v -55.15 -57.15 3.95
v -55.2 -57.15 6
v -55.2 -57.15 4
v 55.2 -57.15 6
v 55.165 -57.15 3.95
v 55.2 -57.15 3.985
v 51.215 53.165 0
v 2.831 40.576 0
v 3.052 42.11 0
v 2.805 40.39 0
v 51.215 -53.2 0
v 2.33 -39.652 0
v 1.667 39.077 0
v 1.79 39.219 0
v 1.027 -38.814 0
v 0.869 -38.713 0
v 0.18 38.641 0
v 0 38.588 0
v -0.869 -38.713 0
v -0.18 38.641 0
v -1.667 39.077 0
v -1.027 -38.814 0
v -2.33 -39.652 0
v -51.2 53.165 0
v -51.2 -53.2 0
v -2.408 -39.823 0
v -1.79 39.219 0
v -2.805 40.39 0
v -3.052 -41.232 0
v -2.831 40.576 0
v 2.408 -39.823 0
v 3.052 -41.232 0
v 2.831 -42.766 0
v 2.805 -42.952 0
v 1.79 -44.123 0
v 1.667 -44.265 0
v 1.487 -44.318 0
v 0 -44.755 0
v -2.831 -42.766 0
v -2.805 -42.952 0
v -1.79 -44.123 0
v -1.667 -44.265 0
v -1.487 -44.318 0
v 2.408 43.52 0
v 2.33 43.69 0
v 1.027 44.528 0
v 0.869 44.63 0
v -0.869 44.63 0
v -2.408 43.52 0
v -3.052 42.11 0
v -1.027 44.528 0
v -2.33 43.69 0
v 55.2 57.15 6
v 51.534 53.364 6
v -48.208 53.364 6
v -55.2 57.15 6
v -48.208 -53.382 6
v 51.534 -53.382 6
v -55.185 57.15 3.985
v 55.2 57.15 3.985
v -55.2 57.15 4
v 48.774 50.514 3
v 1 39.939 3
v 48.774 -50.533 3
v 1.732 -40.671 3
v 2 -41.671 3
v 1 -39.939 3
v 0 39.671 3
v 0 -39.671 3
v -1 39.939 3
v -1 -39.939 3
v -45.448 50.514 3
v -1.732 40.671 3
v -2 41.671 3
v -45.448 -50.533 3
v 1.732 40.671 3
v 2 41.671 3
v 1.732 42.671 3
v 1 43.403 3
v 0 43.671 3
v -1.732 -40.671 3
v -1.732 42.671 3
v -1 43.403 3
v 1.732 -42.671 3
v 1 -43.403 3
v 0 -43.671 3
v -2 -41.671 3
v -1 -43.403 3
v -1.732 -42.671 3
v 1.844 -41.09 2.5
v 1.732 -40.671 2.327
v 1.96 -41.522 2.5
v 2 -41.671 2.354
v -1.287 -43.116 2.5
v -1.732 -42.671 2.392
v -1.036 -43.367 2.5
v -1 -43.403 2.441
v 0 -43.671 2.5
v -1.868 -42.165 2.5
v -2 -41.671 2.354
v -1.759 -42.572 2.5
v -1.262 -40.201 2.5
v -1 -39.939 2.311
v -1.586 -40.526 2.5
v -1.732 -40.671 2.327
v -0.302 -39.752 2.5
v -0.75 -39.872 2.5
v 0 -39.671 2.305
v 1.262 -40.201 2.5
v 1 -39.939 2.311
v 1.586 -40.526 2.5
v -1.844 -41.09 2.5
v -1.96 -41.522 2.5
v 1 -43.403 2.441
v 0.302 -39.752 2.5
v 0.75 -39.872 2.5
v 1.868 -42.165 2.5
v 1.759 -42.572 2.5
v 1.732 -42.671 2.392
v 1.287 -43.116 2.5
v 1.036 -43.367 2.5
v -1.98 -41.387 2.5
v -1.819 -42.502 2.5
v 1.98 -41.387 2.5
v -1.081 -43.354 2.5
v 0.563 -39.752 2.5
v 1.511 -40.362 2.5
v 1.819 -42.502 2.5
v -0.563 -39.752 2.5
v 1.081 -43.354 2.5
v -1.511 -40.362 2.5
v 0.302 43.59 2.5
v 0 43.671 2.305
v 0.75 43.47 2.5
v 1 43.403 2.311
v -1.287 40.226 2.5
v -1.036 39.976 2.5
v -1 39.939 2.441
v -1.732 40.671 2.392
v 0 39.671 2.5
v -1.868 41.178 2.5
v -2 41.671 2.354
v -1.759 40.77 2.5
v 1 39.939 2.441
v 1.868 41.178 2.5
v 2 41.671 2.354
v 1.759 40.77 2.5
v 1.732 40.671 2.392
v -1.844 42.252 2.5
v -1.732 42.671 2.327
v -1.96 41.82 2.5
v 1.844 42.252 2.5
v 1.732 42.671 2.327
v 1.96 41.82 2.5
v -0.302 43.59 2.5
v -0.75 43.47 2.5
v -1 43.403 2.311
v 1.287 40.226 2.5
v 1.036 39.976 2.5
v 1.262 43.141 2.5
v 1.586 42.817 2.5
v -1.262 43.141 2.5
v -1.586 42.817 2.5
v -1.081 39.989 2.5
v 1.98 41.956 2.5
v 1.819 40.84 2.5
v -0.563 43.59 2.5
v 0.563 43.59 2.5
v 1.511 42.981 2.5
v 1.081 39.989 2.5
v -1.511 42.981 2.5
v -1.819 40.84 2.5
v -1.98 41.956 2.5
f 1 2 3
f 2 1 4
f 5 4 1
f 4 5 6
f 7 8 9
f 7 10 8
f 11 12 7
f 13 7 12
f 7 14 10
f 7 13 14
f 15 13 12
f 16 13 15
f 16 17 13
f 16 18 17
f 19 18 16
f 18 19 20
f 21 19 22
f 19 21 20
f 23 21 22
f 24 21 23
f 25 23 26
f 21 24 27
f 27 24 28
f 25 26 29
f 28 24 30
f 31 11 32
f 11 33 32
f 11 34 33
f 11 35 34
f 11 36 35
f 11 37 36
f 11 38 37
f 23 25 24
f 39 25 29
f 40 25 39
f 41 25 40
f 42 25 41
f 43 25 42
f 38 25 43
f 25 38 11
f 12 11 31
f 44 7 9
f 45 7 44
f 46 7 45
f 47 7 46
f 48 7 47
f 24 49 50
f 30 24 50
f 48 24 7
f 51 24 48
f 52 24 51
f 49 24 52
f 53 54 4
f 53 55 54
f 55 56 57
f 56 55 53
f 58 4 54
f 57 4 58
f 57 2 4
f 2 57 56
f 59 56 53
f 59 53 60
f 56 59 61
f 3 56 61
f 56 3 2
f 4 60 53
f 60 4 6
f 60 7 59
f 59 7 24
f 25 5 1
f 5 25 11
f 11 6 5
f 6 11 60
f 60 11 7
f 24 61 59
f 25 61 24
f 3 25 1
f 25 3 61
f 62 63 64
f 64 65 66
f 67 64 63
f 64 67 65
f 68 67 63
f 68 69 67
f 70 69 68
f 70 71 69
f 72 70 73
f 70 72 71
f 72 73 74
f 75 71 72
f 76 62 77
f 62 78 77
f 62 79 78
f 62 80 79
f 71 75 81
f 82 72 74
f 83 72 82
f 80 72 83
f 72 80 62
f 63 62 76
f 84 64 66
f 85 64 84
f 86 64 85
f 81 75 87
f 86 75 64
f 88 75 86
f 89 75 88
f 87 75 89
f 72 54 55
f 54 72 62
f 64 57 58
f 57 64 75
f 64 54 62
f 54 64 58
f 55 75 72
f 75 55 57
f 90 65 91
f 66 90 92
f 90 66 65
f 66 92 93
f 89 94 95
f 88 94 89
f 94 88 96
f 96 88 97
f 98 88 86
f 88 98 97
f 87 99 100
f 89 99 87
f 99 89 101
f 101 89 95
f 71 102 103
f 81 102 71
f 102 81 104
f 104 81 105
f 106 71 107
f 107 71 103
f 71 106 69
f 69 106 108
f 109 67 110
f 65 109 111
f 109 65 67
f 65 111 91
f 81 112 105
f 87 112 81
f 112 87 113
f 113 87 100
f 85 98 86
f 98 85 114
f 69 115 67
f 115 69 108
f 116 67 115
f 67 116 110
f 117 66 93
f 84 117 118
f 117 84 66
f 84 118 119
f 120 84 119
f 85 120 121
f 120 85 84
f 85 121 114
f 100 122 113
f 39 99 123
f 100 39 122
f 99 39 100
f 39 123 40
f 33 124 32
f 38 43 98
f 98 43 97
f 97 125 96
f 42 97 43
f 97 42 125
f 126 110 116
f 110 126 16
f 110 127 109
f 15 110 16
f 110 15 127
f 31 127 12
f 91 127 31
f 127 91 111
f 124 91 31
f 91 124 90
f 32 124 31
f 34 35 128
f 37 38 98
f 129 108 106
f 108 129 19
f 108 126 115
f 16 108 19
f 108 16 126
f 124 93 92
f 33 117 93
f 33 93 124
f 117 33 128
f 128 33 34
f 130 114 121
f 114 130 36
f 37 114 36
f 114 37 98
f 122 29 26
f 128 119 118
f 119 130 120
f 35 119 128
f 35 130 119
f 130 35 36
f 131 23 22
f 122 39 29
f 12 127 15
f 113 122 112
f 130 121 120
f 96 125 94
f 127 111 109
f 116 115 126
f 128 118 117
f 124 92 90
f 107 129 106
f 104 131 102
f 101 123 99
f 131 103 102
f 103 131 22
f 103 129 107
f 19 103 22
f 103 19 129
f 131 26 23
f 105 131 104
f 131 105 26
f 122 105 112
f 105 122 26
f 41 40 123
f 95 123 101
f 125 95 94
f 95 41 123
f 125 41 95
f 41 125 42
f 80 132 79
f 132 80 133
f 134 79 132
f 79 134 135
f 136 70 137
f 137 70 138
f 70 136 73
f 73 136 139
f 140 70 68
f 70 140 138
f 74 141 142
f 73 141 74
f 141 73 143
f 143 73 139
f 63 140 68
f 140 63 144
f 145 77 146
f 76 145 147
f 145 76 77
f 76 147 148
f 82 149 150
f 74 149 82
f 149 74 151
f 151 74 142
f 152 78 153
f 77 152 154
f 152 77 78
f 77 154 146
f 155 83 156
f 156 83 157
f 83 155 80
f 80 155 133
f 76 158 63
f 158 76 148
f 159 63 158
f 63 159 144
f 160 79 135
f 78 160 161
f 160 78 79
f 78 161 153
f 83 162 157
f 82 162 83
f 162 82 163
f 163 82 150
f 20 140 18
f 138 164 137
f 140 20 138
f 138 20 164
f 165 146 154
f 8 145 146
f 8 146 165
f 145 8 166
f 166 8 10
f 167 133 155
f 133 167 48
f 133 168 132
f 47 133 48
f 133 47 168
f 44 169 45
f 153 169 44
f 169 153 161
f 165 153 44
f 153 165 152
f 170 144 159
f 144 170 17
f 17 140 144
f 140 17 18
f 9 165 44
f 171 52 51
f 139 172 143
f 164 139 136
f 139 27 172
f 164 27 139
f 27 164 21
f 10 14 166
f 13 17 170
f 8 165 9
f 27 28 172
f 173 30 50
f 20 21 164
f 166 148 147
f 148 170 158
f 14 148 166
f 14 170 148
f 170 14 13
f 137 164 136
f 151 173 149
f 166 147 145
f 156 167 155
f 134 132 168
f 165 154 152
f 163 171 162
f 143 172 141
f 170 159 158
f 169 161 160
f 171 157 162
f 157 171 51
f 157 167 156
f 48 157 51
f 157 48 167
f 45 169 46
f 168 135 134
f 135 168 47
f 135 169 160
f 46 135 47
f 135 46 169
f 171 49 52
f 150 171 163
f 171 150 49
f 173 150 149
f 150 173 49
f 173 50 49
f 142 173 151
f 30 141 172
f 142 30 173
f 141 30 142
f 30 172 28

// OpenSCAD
// WALLY - Wall Plate Customizer v1.3
// by TheNewHobbyist 2013 (http://thenewhobbyist.com)
// http://www.thingiverse.com/thing:47956
//
// Most of the connectors used with this thing are panel mount connectors from
// www.DataPro.net I can't vouch for their quality but they did have easy to
// find dimensions for their products so I used them.
//
// This could be tightened up considerably but I thought I'd get it out there for people
// to experiment with before I lose my mind staring at it too long. Also this is my
// first OpenSCAD model so cut me some slack ;)
//
//   Notes:
//
// * The plug types "Duplex Outlet", "Long_Toggle Switch", "Toggle Switch", and "Rocker"
//   will all use the entire plate when selected in top or bottom configuration. The
//   other selection (if not "none" will be selected.
//
// * "None" and "Blank should not be considered equal. if "None" is selected for one of
//   the two holes on a plate the other selection will be centered on that plate. If
//   "Blank" is selected that plug location will remain blank but the other selection
//   will NOT move into a centered position.
//
//	Change Log:
//
//	v1.1
//	UPDATED: Screw hole locations for designer and toggle plate types.
//	UPDATED: Hole size for designer plate type.
//	UPDATED: Outlet hole spacing
//
//	v1.2
//	ADDED: Long Toggle Switch for laird
//
//	v1.3
//	ADDED: 3 new sizes for plate export: Standard, Junior-Jumbo, and Jumbo.
//

  //////////////////////////
 // Customizer Settings: //
//////////////////////////

//How big are we talkin' here?
plate_width = 1; //	[1:5]

// Bigger hole in your wall? Try this
plate_size = 0; // [0:Standard, 1:Junior-Jumbo, 2:Jumbo,]

//Pick a plug or full plate type
1st_plate = "none";  //	["none":None, "blank":Blank Port, "toggle":Full Plate - Toggle Switch, "long_toggle":Full Plate - Long Toggle Switch, "outlet":Full Plate - Duplex Outlet, "rocker":Full Plate - Rocker/Designer Plate, "keystone1":Keystone Jack, "vga":VGA Port, "hdmi":HDMI Port, "dvi":DVI-I Port, "displayport":Displayport, "cat5e":Cat5e/Cat6 Port, "usb-a":USB-A Port, "usb-b":USB-B Port, "firewire":Firewire IEEE 1394 Port, "db09":DB-09 Port, "ps2":PS2 Port, "f-type": F-Type/Coaxial Port,"svideo":S-Video Port, "stereo":Stereo Headphone Jack]
//Pick a bottom plug type or leave as none
1st_plate_bottom_hole = "none";  //	["none":None, "blank":Blank Port, "keystone1":Keystone Jack, "vga":VGA Port, "hdmi":HDMI Port, "dvi":DVI-I Port, "displayport":Displayport, "cat5e":Cat5e/Cat6 Port, "usb-a":USB-A Port, "usb-b":USB-B Port, "firewire":Firewire IEEE 1394 Port, "db09":DB-09 Port, "ps2":PS2 Port, "f-type": F-Type/Coaxial Port,"svideo":S-Video Port, "stereo":Stereo Headphone Jack]
//Pick a plug or full plate type
2nd_plate = "none";  //	["none":None, "blank":Blank Port, "toggle":Full Plate - Toggle Switch, "long_toggle":Full Plate - Long Toggle Switch, "outlet":Full Plate - Duplex Outlet, "rocker":Full Plate - Rocker/Designer Plate, "keystone1":Keystone Jack, "vga":VGA Port, "hdmi":HDMI Port, "dvi":DVI-I Port, "displayport":Displayport, "cat5e":Cat5e/Cat6 Port, "usb-a":USB-A Port, "usb-b":USB-B Port, "firewire":Firewire IEEE 1394 Port, "db09":DB-09 Port, "ps2":PS2 Port, "f-type": F-Type/Coaxial Port,"svideo":S-Video Port, "stereo":Stereo Headphone Jack]
//Pick a bottom plug type or leave as none
2nd_plate_bottom_hole = "none";  //	["none":None, "blank":Blank Port, "keystone1":Keystone Jack, "vga":VGA Port, "hdmi":HDMI Port, "dvi":DVI-I Port, "displayport":Displayport, "cat5e":Cat5e/Cat6 Port, "usb-a":USB-A Port, "usb-b":USB-B Port, "firewire":Firewire IEEE 1394 Port, "db09":DB-09 Port, "ps2":PS2 Port, "f-type": F-Type/Coaxial Port,"svideo":S-Video Port, "stereo":Stereo Headphone Jack]
//Pick a plug or full plate type
3rd_plate = "none";  //	["none":None, "blank":Blank Port, "toggle":Full Plate - Toggle Switch, "long_toggle":Full Plate - Long Toggle Switch, "outlet":Full Plate - Duplex Outlet, "rocker":Full Plate - Rocker/Designer Plate, "keystone1":Keystone Jack, "vga":VGA Port, "hdmi":HDMI Port, "dvi":DVI-I Port, "displayport":Displayport, "cat5e":Cat5e/Cat6 Port, "usb-a":USB-A Port, "usb-b":USB-B Port, "firewire":Firewire IEEE 1394 Port, "db09":DB-09 Port, "ps2":PS2 Port, "f-type": F-Type/Coaxial Port,"svideo":S-Video Port, "stereo":Stereo Headphone Jack]
//Pick a bottom plug type or leave as none
3rd_plate_bottom_hole = "none";  //	["none":None, "blank":Blank Port, "keystone1":Keystone Jack, "vga":VGA Port, "hdmi":HDMI Port, "dvi":DVI-I Port, "displayport":Displayport, "cat5e":Cat5e/Cat6 Port, "usb-a":USB-A Port, "usb-b":USB-B Port, "firewire":Firewire IEEE 1394 Port, "db09":DB-09 Port, "ps2":PS2 Port, "f-type": F-Type/Coaxial Port,"svideo":S-Video Port, "stereo":Stereo Headphone Jack]
//Pick a plug or full plate type
4th_plate = "none";  //["none":None, "blank":Blank Port, "toggle":Full Plate - Toggle Switch, "long_toggle":Full Plate - Long Toggle Switch, "outlet":Full Plate - Duplex Outlet, "rocker":Full Plate - Rocker/Designer Plate, "keystone1":Keystone Jack, "vga":VGA Port, "hdmi":HDMI Port, "dvi":DVI-I Port, "displayport":Displayport, "cat5e":Cat5e/Cat6 Port, "usb-a":USB-A Port, "usb-b":USB-B Port, "firewire":Firewire IEEE 1394 Port, "db09":DB-09 Port, "ps2":PS2 Port, "f-type": F-Type/Coaxial Port,"svideo":S-Video Port, "stereo":Stereo Headphone Jack]
//Pick a bottom plug type or leave as none
4th_plate_bottom_hole = "none";  //	["none":None, "blank":Blank Port, "keystone1":Keystone Jack, "vga":VGA Port, "hdmi":HDMI Port, "dvi":DVI-I Port, "displayport":Displayport, "cat5e":Cat5e/Cat6 Port, "usb-a":USB-A Port, "usb-b":USB-B Port, "firewire":Firewire IEEE 1394 Port, "db09":DB-09 Port, "ps2":PS2 Port, "f-type": F-Type/Coaxial Port,"svideo":S-Video Port, "stereo":Stereo Headphone Jack]
//Pick a plug or full plate type
5th_plate = "none";  //["none":None, "blank":Blank Port, "toggle":Full Plate - Toggle Switch, "long_toggle":Full Plate - Long Toggle Switch, "outlet":Full Plate - Duplex Outlet, "rocker":Full Plate - Rocker/Designer Plate, "keystone1":Keystone Jack, "vga":VGA Port, "hdmi":HDMI Port, "dvi":DVI-I Port, "displayport":Displayport, "cat5e":Cat5e/Cat6 Port, "usb-a":USB-A Port, "usb-b":USB-B Port, "firewire":Firewire IEEE 1394 Port, "db09":DB-09 Port, "ps2":PS2 Port, "f-type": F-Type/Coaxial Port,"svideo":S-Video Port, "stereo":Stereo Headphone Jack]
//Pick a bottom plug type or leave as none
5th_plate_bottom_hole = "none";  //	["none":None, "blank":Blank Port, "keystone1":Keystone Jack, "vga":VGA Port, "hdmi":HDMI Port, "dvi":DVI-I Port, "displayport":Displayport, "cat5e":Cat5e/Cat6 Port, "usb-a":USB-A Port, "usb-b":USB-B Port, "firewire":Firewire IEEE 1394 Port, "db09":DB-09 Port, "ps2":PS2 Port, "f-type": F-Type/Coaxial Port,"svideo":S-Video Port, "stereo":Stereo Headphone Jack]

  //////////////////////
 // Static Settings: //
//////////////////////

module GoAwayCustomizer() {
// This module is here to stop Customizer from picking up the variables below
}

l_offset = [55.2,39.6875,44.45];//34.925,39.6875
r_offset = [55.2,39.6875,44.45];
spacer = [0,0,46.0375,92.075,138.1125,184.15];
solid_plate_width = l_offset[plate_size] + spacer[plate_width] + r_offset[plate_size];//!!!!plate width squeaspacer[plate_width*2] r!!!!!

height_sizes = [114.3,123.825,133.35];

height =114.3 ; //plate height (static)114.3
gang_width=[0,69.86,115.824,161.925,206.375,254]; // Plate widths (standard)69.86

edgewidth = solid_plate_width + 10; // Bevel setting for top and bottom
rightbevel = solid_plate_width -4; // Bevel for right side (scales)

left_offset = 34.925; // Offset first hole position34.925
switch_offset = 46.0375; // Offset all additional holes
thinner_offset=[0,0.92,0.95,0.96,0.97,0.973]; // Manual fix for right side wackiness

positions=[height_sizes[plate_size]/2,height_sizes[plate_size]/2 - 14.25,height_sizes[plate_size]/2 + 14.25];

// preview[view:north, tilt:bottom]

  ///////////////////
 // Hole Control: //
///////////////////

module plate1(){
	if (1st_plate == "toggle" || 1st_plate_bottom_hole == "toggle"){
		translate([0,l_offset[plate_size],0]) toggle_screws();
		translate([0,l_offset[plate_size],0]) hole("toggle");
		}
	else if (1st_plate == "long_toggle" || 1st_plate_bottom_hole == "long_toggle"){
		translate([0,l_offset[plate_size],0]) toggle_screws();
		translate([0,l_offset[plate_size],0]) hole("long_toggle");
		}
	else if (1st_plate == "rocker" || 1st_plate_bottom_hole == "rocker"){
		translate([0,l_offset[plate_size],0]) rocker_screws();
		translate([0,l_offset[plate_size],0]) hole("rocker");
		}
	else if (1st_plate == "outlet" || 1st_plate_bottom_hole == "outlet") {
	translate([0,l_offset[plate_size],0]) hole("outlet");
	}
	else if (1st_plate_bottom_hole == "none") {
		translate([0,l_offset[plate_size],0]) box_screws();
		translate([positions[0],l_offset[plate_size],0]) hole(1st_plate);
			}
	else if (1st_plate == "none") {
		translate([0,l_offset[plate_size],0]) box_screws();
		translate([positions[0],l_offset[plate_size],0]) hole(1st_plate_bottom_hole);
			}
	else {
	translate([0,l_offset[plate_size],0]) box_screws();
	translate([positions[1],l_offset[plate_size],0]) hole(1st_plate);
	translate([positions[2],l_offset[plate_size],0]) hole(1st_plate_bottom_hole);
	}
}

module plate2(){
	if (2nd_plate == "toggle" || 2nd_plate_bottom_hole == "toggle"){
		translate([0,l_offset[plate_size] + switch_offset,0]) toggle_screws();
		translate([0,l_offset[plate_size] + switch_offset,0]) hole("toggle");
		}
	else if (2nd_plate == "long_toggle" || 2nd_plate_bottom_hole == "long_toggle"){
		translate([0,l_offset[plate_size] + switch_offset,0]) toggle_screws();
		translate([0,l_offset[plate_size] + switch_offset,0]) hole("long_toggle");
		}
	else if (2nd_plate == "rocker" || 2nd_plate_bottom_hole == "rocker"){
		translate([0,l_offset[plate_size] + switch_offset,0]) rocker_screws();
		translate([0,l_offset[plate_size] + switch_offset,0]) hole("rocker");
		}
	else if (2nd_plate == "outlet" || 2nd_plate_bottom_hole == "outlet") {
	translate([0,l_offset[plate_size] + switch_offset,0]) hole("outlet");
	}
	else if (2nd_plate_bottom_hole == "none") {
		translate([0,l_offset[plate_size] + switch_offset,0]) box_screws();
		translate([positions[0],l_offset[plate_size] + switch_offset,0]) hole(2nd_plate);
			}
	else if (2nd_plate == "none") {
		translate([0,l_offset[plate_size] + switch_offset,0]) box_screws();
		translate([positions[0],l_offset[plate_size] + switch_offset,0]) hole(2nd_plate_bottom_hole);
			}
	else {
	translate([0,l_offset[plate_size] + switch_offset,0]) box_screws();
	translate([positions[1],l_offset[plate_size] + switch_offset,0]) hole(2nd_plate);
	translate([positions[2],l_offset[plate_size] + switch_offset,0]) hole(2nd_plate_bottom_hole);
	}
}

module plate3(){
	if (3rd_plate == "toggle" || 3rd_plate_bottom_hole == "toggle"){
		translate([0,l_offset[plate_size] + switch_offset * 2,0]) toggle_screws();
		translate([0,l_offset[plate_size] + switch_offset * 2,0]) hole("toggle");
		}
	else if (3rd_plate == "long_toggle" || 3rd_plate_bottom_hole == "long_toggle"){
		translate([0,l_offset[plate_size] + switch_offset * 2,0]) toggle_screws();
		translate([0,l_offset[plate_size] + switch_offset * 2,0]) hole("long_toggle");
		}
	else if (3rd_plate == "rocker" || 3rd_plate_bottom_hole == "rocker"){
		translate([0,l_offset[plate_size] + switch_offset * 2,0]) rocker_screws();
		translate([0,l_offset[plate_size] + switch_offset * 2,0]) hole("rocker");
		}
	else if (3rd_plate == "outlet" || 3rd_plate_bottom_hole == "outlet") {
	translate([0,l_offset[plate_size] + switch_offset * 2,0]) hole("outlet");
	}
	else if (3rd_plate_bottom_hole == "none") {
		translate([0,l_offset[plate_size] + switch_offset * 2,0]) box_screws();
		translate([positions[0],l_offset[plate_size] + switch_offset * 2,0]) hole(3rd_plate);
			}
	else if (3rd_plate == "none") {
		translate([0,l_offset[plate_size] + switch_offset * 2,0]) box_screws();
		translate([positions[0],l_offset[plate_size] + switch_offset * 2,0]) hole(3rd_plate_bottom_hole);
			}
	else {
	translate([0,l_offset[plate_size] + switch_offset * 2,0]) box_screws();
	translate([positions[1],l_offset[plate_size] + switch_offset * 2,0]) hole(3rd_plate);
	translate([positions[2],l_offset[plate_size] + switch_offset * 2,0]) hole(3rd_plate_bottom_hole);
	}
}

module plate4(){
	if (4th_plate == "toggle" || 4th_plate_bottom_hole == "toggle"){
		translate([0,l_offset[plate_size] + switch_offset * 3,0]) toggle_screws();
		translate([0,l_offset[plate_size] + switch_offset * 3,0]) hole("toggle");
		}
	else if (4th_plate == "long_toggle" || 4th_plate_bottom_hole == "long_toggle"){
		translate([0,l_offset[plate_size] + switch_offset * 3,0]) toggle_screws();
		translate([0,l_offset[plate_size] + switch_offset * 3,0]) hole("long_toggle");
		}
	else if (4th_plate == "rocker" || 4th_plate_bottom_hole == "rocker"){
		translate([0,l_offset[plate_size] + switch_offset * 3,0]) rocker_screws();
		translate([0,l_offset[plate_size] + switch_offset * 3,0]) hole("rocker");
		}
	else if (4th_plate == "outlet" || 4th_plate_bottom_hole == "outlet") {
	translate([0,l_offset[plate_size] + switch_offset * 3,0]) hole("outlet");
	}
	else if (4th_plate_bottom_hole == "none") {
		translate([0,l_offset[plate_size] + switch_offset * 3,0]) box_screws();
		translate([positions[0],l_offset[plate_size] + switch_offset * 3,0]) hole(4th_plate);
			}
	else if (4th_plate == "none") {
		translate([0,l_offset[plate_size] + switch_offset * 3,0]) box_screws();
		translate([positions[0],l_offset[plate_size] + switch_offset * 3,0]) hole(4th_plate_bottom_hole);
			}
	else {
	translate([0,l_offset[plate_size] + switch_offset * 3,0]) box_screws();
	translate([positions[1],l_offset[plate_size] + switch_offset * 3,0]) hole(4th_plate);
	translate([positions[2],l_offset[plate_size] + switch_offset * 3,0]) hole(4th_plate_bottom_hole);
	}
}

module plate5(){
	if (5th_plate == "toggle" || 5th_plate_bottom_hole == "toggle"){
		translate([0,l_offset[plate_size] + switch_offset * 4,0]) toggle_screws();
		translate([0,l_offset[plate_size] + switch_offset * 4,0]) hole("toggle");
		}
	else if (5th_plate == "long_toggle" || 5th_plate_bottom_hole == "long_toggle"){
		translate([0,l_offset[plate_size] + switch_offset * 4,0]) toggle_screws();
		translate([0,l_offset[plate_size] + switch_offset * 4,0]) hole("long_toggle");
		}
	else if (5th_plate == "rocker" || 5th_plate_bottom_hole == "rocker"){
		translate([0,l_offset[plate_size] + switch_offset * 4,0]) rocker_screws();
		translate([0,l_offset[plate_size] + switch_offset * 4,0]) hole("rocker");
		}
	else if (5th_plate == "outlet" || 5th_plate_bottom_hole == "outlet") {
	translate([0,l_offset[plate_size] + switch_offset * 4,0]) hole("outlet");
	}
	else if (5th_plate_bottom_hole == "none") {
		translate([0,l_offset[plate_size] + switch_offset * 4,0]) box_screws();
		translate([positions[0],l_offset[plate_size] + switch_offset * 4,0]) hole(5th_plate);
			}
	else if (5th_plate == "none") {
		translate([0,l_offset[plate_size] + switch_offset * 4,0]) box_screws();
		translate([positions[0],l_offset[plate_size] + switch_offset * 4,0]) hole(5th_plate_bottom_hole);
			}
	else {
	translate([0,l_offset[plate_size] + switch_offset * 4,0]) box_screws();
	translate([positions[1],l_offset[plate_size] + switch_offset * 4,0]) hole(5th_plate);
	translate([positions[2],l_offset[plate_size] + switch_offset * 4,0]) hole(5th_plate_bottom_hole);
	}
}

  /////////////////
 // SolidWorks: //
/////////////////

module plate1_solid(){
if (1st_plate == "keystone1" && 1st_plate_bottom_hole == "none") {
	translate([height_sizes[plate_size]/2 + 14.3,l_offset[plate_size] - 11.5,-3.9]) hole("keystone_solid");
	}
else if (1st_plate == "keystone1" && 1st_plate_bottom_hole != "outlet" && 1st_plate_bottom_hole != "toggle" && 1st_plate_bottom_hole != "rocker") {
	translate([height_sizes[plate_size]/2,l_offset[plate_size] - 11.5,-3.9]) hole("keystone_solid");
	}
if (1st_plate_bottom_hole == "keystone1" && 1st_plate == "none") {
	translate([height_sizes[plate_size]/2 + 14.3,l_offset[plate_size] - 11.5,-3.9]) hole("keystone_solid");
	}
else if (1st_plate_bottom_hole == "keystone1" && 1st_plate != "outlet" && 1st_plate != "toggle" && 1st_plate != "rocker") {
	translate([height_sizes[plate_size]/2 + 28.5,l_offset[plate_size] - 11.5,-3.9]) hole("keystone_solid");
	}

}

module plate2_solid(){
if (2nd_plate == "keystone1" && 2nd_plate_bottom_hole == "none") {
	translate([height_sizes[plate_size]/2 + 14.3,l_offset[plate_size] - 11.5 + switch_offset,-3.9]) hole("keystone_solid");
	}
else if (2nd_plate == "keystone1" && 2nd_plate_bottom_hole != "outlet" && 2nd_plate_bottom_hole != "toggle" && 2nd_plate_bottom_hole != "rocker") {
	translate([height_sizes[plate_size]/2,l_offset[plate_size] - 11.5 + switch_offset,-3.9]) hole("keystone_solid");
	}
if (2nd_plate_bottom_hole == "keystone1" && 2nd_plate == "none") {
	translate([height_sizes[plate_size]/2 + 14.3,l_offset[plate_size] - 11.5 + switch_offset,-3.9]) hole("keystone_solid");
	}
else if (2nd_plate_bottom_hole == "keystone1" && 2nd_plate != "outlet" && 2nd_plate != "toggle" && 2nd_plate != "rocker") {
	translate([height_sizes[plate_size]/2 + 28.5,l_offset[plate_size] - 11.5 + switch_offset,-3.9]) hole("keystone_solid");
	}

}

module plate3_solid(){
if (3rd_plate == "keystone1" && 3rd_plate_bottom_hole == "none") {
	translate([height_sizes[plate_size]/2 + 14.3,l_offset[plate_size] - 11.5 + switch_offset * 2,-3.9]) hole("keystone_solid");
	}
else if (3rd_plate == "keystone1" && 3rd_plate_bottom_hole != "outlet" && 3rd_plate_bottom_hole != "toggle" && 3rd_plate_bottom_hole != "rocker") {
	translate([height_sizes[plate_size]/2,l_offset[plate_size] - 11.5 + switch_offset * 2,-3.9]) hole("keystone_solid");
	}
if (3rd_plate_bottom_hole == "keystone1" && 3rd_plate == "none") {
	translate([height_sizes[plate_size]/2 + 14.3,l_offset[plate_size] - 11.5 + switch_offset * 2,-3.9]) hole("keystone_solid");
	}
else if (3rd_plate_bottom_hole == "keystone1" && 3rd_plate != "outlet" && 3rd_plate != "toggle" && 3rd_plate != "rocker") {
	translate([height_sizes[plate_size]/2 + 28.5,l_offset[plate_size] - 11.5 + switch_offset * 2,-3.9]) hole("keystone_solid");
	}

}

module plate4_solid(){
if (4th_plate == "keystone1" && 4th_plate_bottom_hole == "none") {
	translate([height_sizes[plate_size]/2 + 14.3,l_offset[plate_size] - 11.5 + switch_offset * 3,-3.9]) hole("keystone_solid");
	}
else if (4th_plate == "keystone1" && 4th_plate_bottom_hole != "outlet" && 4th_plate_bottom_hole != "toggle" && 4th_plate_bottom_hole != "rocker") {
	translate([height_sizes[plate_size]/2,l_offset[plate_size] - 11.5 + switch_offset * 3,-3.9]) hole("keystone_solid");
	}
if (4th_plate_bottom_hole == "keystone1" && 4th_plate == "none") {
	translate([height_sizes[plate_size]/2 + 14.3,l_offset[plate_size] - 11.5 + switch_offset * 3,-3.9]) hole("keystone_solid");
	}
else if (4th_plate_bottom_hole == "keystone1" && 4th_plate != "outlet" && 4th_plate != "toggle" && 4th_plate != "rocker") {
	translate([height_sizes[plate_size]/2 + 28.5,l_offset[plate_size] - 11.5 + switch_offset * 3,-3.9]) hole("keystone_solid");
	}

}

module plate5_solid(){
if (5th_plate == "keystone1" && 5th_plate_bottom_hole == "none") {
	translate([height_sizes[plate_size]/2 + 14.3,l_offset[plate_size] - 11.5 + switch_offset * 4,-3.9]) hole("keystone_solid");
	}
else if (5th_plate == "keystone1" && 5th_plate_bottom_hole != "outlet" && 5th_plate_bottom_hole != "toggle" && 5th_plate_bottom_hole != "rocker") {
	translate([height_sizes[plate_size]/2,l_offset[plate_size] - 11.5 + switch_offset * 4,-3.9]) hole("keystone_solid");
	}
if (5th_plate_bottom_hole == "keystone1" && 5th_plate == "none") {
	translate([height_sizes[plate_size]/2 + 14.3,l_offset[plate_size] - 11.5 + switch_offset * 4,-3.9]) hole("keystone_solid");
	}
else if (5th_plate_bottom_hole == "keystone1" && 5th_plate != "outlet" && 5th_plate != "toggle" && 5th_plate != "rocker") {
	translate([height_sizes[plate_size]/2 + 28.5,l_offset[plate_size] - 11.5 + switch_offset * 4,-3.9]) hole("keystone_solid");
	}

}

  ///////////////////
 // PlateStation: //
///////////////////

//Plate size and bevel
module plate() {
	difference() {
		cube([height_sizes[plate_size],solid_plate_width,6]);//solid_plate_width
		translate([-4.3,-5,6.2]) rotate([0,45,0]) cube([6,edgewidth,6]); //Top Bevel
		translate([height_sizes[plate_size]-4.2,-5,6.25]) rotate([0,45,0]) cube([6,edgewidth,6]); //Bottom Bevel
		translate([height_sizes[plate_size]+10,-4.4,6.1]) rotate([0,45,90]) cube([6,height_sizes[plate_size]+20,6]); //Left Bevel (doesn't change)
		translate([height_sizes[plate_size]+10,rightbevel,6]) rotate([0,45,90]) cube([6,height_sizes[plate_size]+10,6]); //Right Bevel (scales right)
				}
			}


// Thinning Plate
module plate_inner() {
	scale([0.95,thinner_offset[plate_width],1]){
	translate([3,3,0]){
	difference() {
		cube([height_sizes[plate_size],solid_plate_width,6]);
		translate([-4.3,-5,6.2]) rotate([0,45,0]) cube([6,edgewidth,6]); //Top Bevel
		translate([height_sizes[plate_size]-4.2,-5,6.25]) rotate([0,45,0]) cube([6,edgewidth,6]); //Bottom Bevel
		translate([height_sizes[plate_size]+10,-4.4,6.1]) rotate([0,45,90]) cube([6,height_sizes[plate_size]+20,6]); //Left Bevel (doesn't change)
		translate([height_sizes[plate_size]+10,rightbevel,6]) rotate([0,45,90]) cube([6,height_sizes[plate_size]+10,6]); //Right Bevel (scales right)
				}
			}
		}
	}

// Box screw holes
module box_screws(){
	 translate([height_sizes[plate_size]/2 + 41.67125,0,-1]) cylinder(r=2, h=10, $fn=12);//23 position of holes
	 translate([height_sizes[plate_size]/2 + 41.67125,0,3.5]) cylinder(r1=2, r2=3.3, h=3);
	 translate([height_sizes[plate_size]/2 - 41.67125,0,-1]) cylinder(r=2, h=10, $fn=12);
	 translate([height_sizes[plate_size]/2 - 41.67125,0,3.5]) cylinder(r1=2, r2=3.3, h=3);
}

// Rocker/Designer screw holes
module rocker_screws(){
	 translate([height_sizes[plate_size]/2 + 48.41875,0,-1]) cylinder(r=2, h=10, $fn=12);
	 translate([height_sizes[plate_size]/2 + 48.41875,0,3.5]) cylinder(r1=2, r2=3.3, h=3);
	 translate([height_sizes[plate_size]/2 - 48.41875,0,-1]) cylinder(r=2, h=10, $fn=12);
	 translate([height_sizes[plate_size]/2 - 48.41875,0,3.5]) cylinder(r1=2, r2=3.3, h=3);
}

// Toggle screw holes
module toggle_screws(){
	 translate([height_sizes[plate_size]/2 + 30.1625,0,-1]) cylinder(r=2, h=10, $fn=12);
	 translate([height_sizes[plate_size]/2 + 30.1625,0,3.5]) cylinder(r1=2, r2=3.3, h=3);
	 translate([height_sizes[plate_size]/2 - 30.1625,0,-1]) cylinder(r=2, h=10, $fn=12);
	 translate([height_sizes[plate_size]/2 - 30.1625,0,3.5]) cylinder(r1=2, r2=3.3, h=3);
}

  ///////////////
 // Portland: //
///////////////

// Hole Cutout definitions
module hole(hole_type) {


// Toggle switch hole
	if (hole_type == "toggle") {
		translate([height_sizes[plate_size]/2,0,0]) cube([23.8125,10.3188,15], center = true);
		 						}

// Toggle switch hole and screw holes
	if (hole_type == "long_toggle") {
		translate([height_sizes[plate_size]/2,0,0]) cube([43.6563,11.9063,15], center = true);
		 						}

// Rocker switch plate
	if (hole_type == "rocker") {
		translate([height_sizes[plate_size]/2,0,0]) cube([67.1,33.3,15], center = true);

		 						}

// Duplex power outlet plate or dual side toggles
	if (hole_type == "outlet" || hole_type == "dualsidetoggle") {
		translate([height_sizes[plate_size]/2 + 19.3915,0,0]) {
			difference() {
				cylinder(r=17.4625, h=15, center = true);
				translate([-24.2875,-15,-2]) cube([10,37,15], center = false);
				translate([14.2875,-15,-2]) cube([10,37,15], center = false);
								}
							}
		translate([height_sizes[plate_size]/2 - 19.3915,0,0]){
			difference(){
				cylinder(r=17.4625, h=15, center = true);
				translate([-24.2875,-15,-2]) cube([10,37,15], center = false);
				translate([14.2875,-15,-2]) cube([10,37,15], center = false);
								}
							}
		translate([height_sizes[plate_size]/2,0,-1]) cylinder(r=2, h=10);
		translate([height_sizes[plate_size]/2,0,3.5]) cylinder(r1=2, r2=3.3, h=3);
							}

// Blank plate
	if (hole_type == "blank") { }

// VGA & DB09 plate
// VGA Fits http://www.datapro.net/products/vga-dual-panel-mount-f-f-cable.html
// DB09 Fits http://www.datapro.net/products/db9-serial-panel-mount-male-extension.html
	if (hole_type == "vga" || hole_type == "db09") {

			translate([0,-12.5,3]) cylinder(r=1.75, h=10, center = true);
			translate([0,12.5,3]) cylinder(r=1.75, h=10, center = true);
				difference(){
					cube([10,19,13], center=true);
					translate([-5,-9.2,1]) rotate([0,0,-35.6]) cube([4.4,2.4,15], center=true);
					translate([.9,-11.2,0]) rotate([0,0,9.6]) cube([10,4.8,15], center=true);
					translate([4.6,-8.5,0]) rotate([0,0,37.2]) cube([4.4,2.4,15], center=true);
					translate([-5,9.2,1]) rotate([0,0,35.6]) cube([4.4,2.4,15], center=true);
					translate([0.9,11.2,0]) rotate([0,0,-9.6]) cube([10,4.8,15], center=true);
					translate([4.6,8.5,0]) rotate([0,0,-37.2]) cube([4.4,2.4,15], center=true);
								}
						}

// HDMI plate
// Fits http://www.datapro.net/products/hdmi-panel-mount-extension-cable.html
	if (hole_type == "hdmi") {
		translate([0,-13,3]) cylinder(r=1.75, h=10, center = true);
		translate([0,13,3]) cylinder(r=1.75, h=10, center = true);
		translate([0,0,3]) cube([6,16,10], center=true);
							}

// DVI-I plate
// Fits http://www.datapro.net/products/dvi-i-panel-mount-extension-cable.html
	if (hole_type == "dvi") {
		translate([0,-16,3]) cylinder(r=1.75, h=10, center = true);
		translate([0,16,3]) cylinder(r=1.75, h=10, center = true);
		translate([0,0,3]) cube([10,26,10], center=true);
							}

// DisplayPort plate
// Fits http://www.datapro.net/products/dvi-i-panel-mount-extension-cable.html
	if (hole_type == "displayport") {
		translate([0,-13.5,3]) cylinder(r=1.75, h=10, center = true);
		translate([0,13.5,3]) cylinder(r=1.75, h=10, center = true);
		translate([0,0,0]){
			difference(){
				translate([0,0,3]) cube([7,19,10], center=true);
				translate([2.47,-9.37,3]) rotate([0,0,-54.6]) cube([3,5,14], center=true);
						}
								}
									}

// USB-A Plate
// Fits http://www.datapro.net/products/usb-panel-mount-type-a-cable.html
	if (hole_type == "usb-a") {
		translate([0,-15,3]) cylinder(r=1.75, h=10, center = true);
		translate([0,15,3]) cylinder(r=1.75, h=10, center = true);
		translate([0,0,3]) cube([8,16,10], center=true);
							}

// USB-B Plate
// Fits http://www.datapro.net/products/usb-panel-mount-type-b-cable.html
	if (hole_type == "usb-b") {
		translate([0,-13,3]) cylinder(r=1.75, h=10, center = true);
		translate([0,13,3]) cylinder(r=1.75, h=10, center = true);
		translate([0,0,3]) cube([11,12,10], center=true);
							}

// 1394 Firewire Plate
// Fits http://www.datapro.net/products/firewire-panel-mount-extension.html
	if (hole_type == "firewire") {
		translate([0,-13.5,3]) cylinder(r=1.75, h=10, center = true);
		translate([0,13.5,3]) cylinder(r=1.75, h=10, center = true);
		translate([0,0,3]) cube([7,12,10], center=true);
							}

// F-Type / Cable TV Plate
// Fits http://www.datapro.net/products/f-type-panel-mounting-coupler.html
	if (hole_type == "f-type") {
		translate([0,0,3]) cylinder(r=4.7625, h=10, center=true);
							}

// Cat5e & Gat6 plate
// Cat5e Fits http://www.datapro.net/products/cat-5e-panel-mount-ethernet.html
// Cat6 Fits hhttp://www.datapro.net/products/cat-6-panel-mount-ethernet.html
	if (hole_type == "cat5e" || hole_type == "cat6") {
		translate([0,-12.5,3]) cylinder(r=1.75, h=10, center = true);
		translate([0,12.5,3]) cylinder(r=1.75, h=10, center = true);
		translate([0,0,3]) cube([15,15,10], center=true);
		}

// S-Video & PS2 plate
// S-Video Fits hhttp://www.datapro.net/products/cat-6-panel-mount-ethernet.html
// PS2 http://www.datapro.net/products/ps2-panel-mount-extension-cable.html
	if (hole_type == "svideo" || hole_type == "ps2") {
		translate([0,-10,3]) cylinder(r=1.75, h=10, center = true);
		translate([0,10,3]) cylinder(r=1.75, h=10, center = true);
		translate([0,0,3]) cylinder(r=5, h=10, center=true);
		}


// Stereo / 1/4" headphone jack coupler
// Stereo coupler Fits http://www.datapro.net/products/stereo-panel-mount-coupler.html
	if (hole_type == "stereo") {
		translate([0,0,3]) cylinder(r=2.985, h=10, center=true);
		}

//Keystone1 hole
//Hole for 1 Keystone Jack
	if (hole_type == "keystone1") {
		translate([0,0,5]) cube([16.5,15,10], center = true);
	}

//Keystone Solid
	if (hole_type == "keystone_solid") {
		rotate([0,0,90]) {
			difference(){
				translate([0,0,.1]) cube([23,30.5,9.8]);
					translate([4,4,0]){
						difference(){
							cube([15,22.5,10]);
							translate([-1,-0.001,3.501]) cube([17,2,6.5]);
							translate([-1,2.5,-3.40970]) rotate([45,0,0]) cube([17,2,6.5]);
							translate([-1,18.501,6.001]) cube([17,4,4]);
							translate([-1,20.5,0]) rotate([-45,0,0]) cube([17,2,6.5]);
						}
					}
				}
			}
		}

//End of module "hole"
}

  ////////////////////////
 // Number One ENGAGE: //
////////////////////////

// Rotate so it sits correctly on plate (whoops) and make upside down
rotate([0,180,90]){
// put plate at 0,0,0 for easier printing
translate([-height_sizes[plate_size]/2,-solid_plate_width/2,-6]){

if (plate_width == 1) {
	difference() {
		plate();
		translate([0,0,-3]) plate_inner();
		plate1();
			}
		union() {
		plate1_solid();
		}
			}

else if (plate_width == 2) {
difference()
{
plate();
translate([0,0,-3]) plate_inner();
plate1();
plate2();
}
union() {
		plate1_solid();
		plate2_solid();
		}
}

else if (plate_width == 3) {
difference()
{
plate();
translate([0,0,-3]) plate_inner();
plate1();
plate2();
plate3();
}
union() {
		plate1_solid();
		plate2_solid();
		plate3_solid();
		}
}

else if (plate_width == 4) {
difference()
{
plate();
translate([0,0,-3]) plate_inner();
plate1();
plate2();
plate3();
plate4();
}
union() {
		plate1_solid();
		plate2_solid();
		plate3_solid();
		plate4_solid();
		}
}

else if (plate_width == 5) {
difference()
{
plate();
translate([0,0,-3]) plate_inner();
plate1();
plate2();
plate3();
plate4();
plate5();
}
union() {
		plate1_solid();
		plate2_solid();
		plate3_solid();
		plate4_solid();
		plate5_solid();
		}
}

//End Rotate
}
//End Translate
}
